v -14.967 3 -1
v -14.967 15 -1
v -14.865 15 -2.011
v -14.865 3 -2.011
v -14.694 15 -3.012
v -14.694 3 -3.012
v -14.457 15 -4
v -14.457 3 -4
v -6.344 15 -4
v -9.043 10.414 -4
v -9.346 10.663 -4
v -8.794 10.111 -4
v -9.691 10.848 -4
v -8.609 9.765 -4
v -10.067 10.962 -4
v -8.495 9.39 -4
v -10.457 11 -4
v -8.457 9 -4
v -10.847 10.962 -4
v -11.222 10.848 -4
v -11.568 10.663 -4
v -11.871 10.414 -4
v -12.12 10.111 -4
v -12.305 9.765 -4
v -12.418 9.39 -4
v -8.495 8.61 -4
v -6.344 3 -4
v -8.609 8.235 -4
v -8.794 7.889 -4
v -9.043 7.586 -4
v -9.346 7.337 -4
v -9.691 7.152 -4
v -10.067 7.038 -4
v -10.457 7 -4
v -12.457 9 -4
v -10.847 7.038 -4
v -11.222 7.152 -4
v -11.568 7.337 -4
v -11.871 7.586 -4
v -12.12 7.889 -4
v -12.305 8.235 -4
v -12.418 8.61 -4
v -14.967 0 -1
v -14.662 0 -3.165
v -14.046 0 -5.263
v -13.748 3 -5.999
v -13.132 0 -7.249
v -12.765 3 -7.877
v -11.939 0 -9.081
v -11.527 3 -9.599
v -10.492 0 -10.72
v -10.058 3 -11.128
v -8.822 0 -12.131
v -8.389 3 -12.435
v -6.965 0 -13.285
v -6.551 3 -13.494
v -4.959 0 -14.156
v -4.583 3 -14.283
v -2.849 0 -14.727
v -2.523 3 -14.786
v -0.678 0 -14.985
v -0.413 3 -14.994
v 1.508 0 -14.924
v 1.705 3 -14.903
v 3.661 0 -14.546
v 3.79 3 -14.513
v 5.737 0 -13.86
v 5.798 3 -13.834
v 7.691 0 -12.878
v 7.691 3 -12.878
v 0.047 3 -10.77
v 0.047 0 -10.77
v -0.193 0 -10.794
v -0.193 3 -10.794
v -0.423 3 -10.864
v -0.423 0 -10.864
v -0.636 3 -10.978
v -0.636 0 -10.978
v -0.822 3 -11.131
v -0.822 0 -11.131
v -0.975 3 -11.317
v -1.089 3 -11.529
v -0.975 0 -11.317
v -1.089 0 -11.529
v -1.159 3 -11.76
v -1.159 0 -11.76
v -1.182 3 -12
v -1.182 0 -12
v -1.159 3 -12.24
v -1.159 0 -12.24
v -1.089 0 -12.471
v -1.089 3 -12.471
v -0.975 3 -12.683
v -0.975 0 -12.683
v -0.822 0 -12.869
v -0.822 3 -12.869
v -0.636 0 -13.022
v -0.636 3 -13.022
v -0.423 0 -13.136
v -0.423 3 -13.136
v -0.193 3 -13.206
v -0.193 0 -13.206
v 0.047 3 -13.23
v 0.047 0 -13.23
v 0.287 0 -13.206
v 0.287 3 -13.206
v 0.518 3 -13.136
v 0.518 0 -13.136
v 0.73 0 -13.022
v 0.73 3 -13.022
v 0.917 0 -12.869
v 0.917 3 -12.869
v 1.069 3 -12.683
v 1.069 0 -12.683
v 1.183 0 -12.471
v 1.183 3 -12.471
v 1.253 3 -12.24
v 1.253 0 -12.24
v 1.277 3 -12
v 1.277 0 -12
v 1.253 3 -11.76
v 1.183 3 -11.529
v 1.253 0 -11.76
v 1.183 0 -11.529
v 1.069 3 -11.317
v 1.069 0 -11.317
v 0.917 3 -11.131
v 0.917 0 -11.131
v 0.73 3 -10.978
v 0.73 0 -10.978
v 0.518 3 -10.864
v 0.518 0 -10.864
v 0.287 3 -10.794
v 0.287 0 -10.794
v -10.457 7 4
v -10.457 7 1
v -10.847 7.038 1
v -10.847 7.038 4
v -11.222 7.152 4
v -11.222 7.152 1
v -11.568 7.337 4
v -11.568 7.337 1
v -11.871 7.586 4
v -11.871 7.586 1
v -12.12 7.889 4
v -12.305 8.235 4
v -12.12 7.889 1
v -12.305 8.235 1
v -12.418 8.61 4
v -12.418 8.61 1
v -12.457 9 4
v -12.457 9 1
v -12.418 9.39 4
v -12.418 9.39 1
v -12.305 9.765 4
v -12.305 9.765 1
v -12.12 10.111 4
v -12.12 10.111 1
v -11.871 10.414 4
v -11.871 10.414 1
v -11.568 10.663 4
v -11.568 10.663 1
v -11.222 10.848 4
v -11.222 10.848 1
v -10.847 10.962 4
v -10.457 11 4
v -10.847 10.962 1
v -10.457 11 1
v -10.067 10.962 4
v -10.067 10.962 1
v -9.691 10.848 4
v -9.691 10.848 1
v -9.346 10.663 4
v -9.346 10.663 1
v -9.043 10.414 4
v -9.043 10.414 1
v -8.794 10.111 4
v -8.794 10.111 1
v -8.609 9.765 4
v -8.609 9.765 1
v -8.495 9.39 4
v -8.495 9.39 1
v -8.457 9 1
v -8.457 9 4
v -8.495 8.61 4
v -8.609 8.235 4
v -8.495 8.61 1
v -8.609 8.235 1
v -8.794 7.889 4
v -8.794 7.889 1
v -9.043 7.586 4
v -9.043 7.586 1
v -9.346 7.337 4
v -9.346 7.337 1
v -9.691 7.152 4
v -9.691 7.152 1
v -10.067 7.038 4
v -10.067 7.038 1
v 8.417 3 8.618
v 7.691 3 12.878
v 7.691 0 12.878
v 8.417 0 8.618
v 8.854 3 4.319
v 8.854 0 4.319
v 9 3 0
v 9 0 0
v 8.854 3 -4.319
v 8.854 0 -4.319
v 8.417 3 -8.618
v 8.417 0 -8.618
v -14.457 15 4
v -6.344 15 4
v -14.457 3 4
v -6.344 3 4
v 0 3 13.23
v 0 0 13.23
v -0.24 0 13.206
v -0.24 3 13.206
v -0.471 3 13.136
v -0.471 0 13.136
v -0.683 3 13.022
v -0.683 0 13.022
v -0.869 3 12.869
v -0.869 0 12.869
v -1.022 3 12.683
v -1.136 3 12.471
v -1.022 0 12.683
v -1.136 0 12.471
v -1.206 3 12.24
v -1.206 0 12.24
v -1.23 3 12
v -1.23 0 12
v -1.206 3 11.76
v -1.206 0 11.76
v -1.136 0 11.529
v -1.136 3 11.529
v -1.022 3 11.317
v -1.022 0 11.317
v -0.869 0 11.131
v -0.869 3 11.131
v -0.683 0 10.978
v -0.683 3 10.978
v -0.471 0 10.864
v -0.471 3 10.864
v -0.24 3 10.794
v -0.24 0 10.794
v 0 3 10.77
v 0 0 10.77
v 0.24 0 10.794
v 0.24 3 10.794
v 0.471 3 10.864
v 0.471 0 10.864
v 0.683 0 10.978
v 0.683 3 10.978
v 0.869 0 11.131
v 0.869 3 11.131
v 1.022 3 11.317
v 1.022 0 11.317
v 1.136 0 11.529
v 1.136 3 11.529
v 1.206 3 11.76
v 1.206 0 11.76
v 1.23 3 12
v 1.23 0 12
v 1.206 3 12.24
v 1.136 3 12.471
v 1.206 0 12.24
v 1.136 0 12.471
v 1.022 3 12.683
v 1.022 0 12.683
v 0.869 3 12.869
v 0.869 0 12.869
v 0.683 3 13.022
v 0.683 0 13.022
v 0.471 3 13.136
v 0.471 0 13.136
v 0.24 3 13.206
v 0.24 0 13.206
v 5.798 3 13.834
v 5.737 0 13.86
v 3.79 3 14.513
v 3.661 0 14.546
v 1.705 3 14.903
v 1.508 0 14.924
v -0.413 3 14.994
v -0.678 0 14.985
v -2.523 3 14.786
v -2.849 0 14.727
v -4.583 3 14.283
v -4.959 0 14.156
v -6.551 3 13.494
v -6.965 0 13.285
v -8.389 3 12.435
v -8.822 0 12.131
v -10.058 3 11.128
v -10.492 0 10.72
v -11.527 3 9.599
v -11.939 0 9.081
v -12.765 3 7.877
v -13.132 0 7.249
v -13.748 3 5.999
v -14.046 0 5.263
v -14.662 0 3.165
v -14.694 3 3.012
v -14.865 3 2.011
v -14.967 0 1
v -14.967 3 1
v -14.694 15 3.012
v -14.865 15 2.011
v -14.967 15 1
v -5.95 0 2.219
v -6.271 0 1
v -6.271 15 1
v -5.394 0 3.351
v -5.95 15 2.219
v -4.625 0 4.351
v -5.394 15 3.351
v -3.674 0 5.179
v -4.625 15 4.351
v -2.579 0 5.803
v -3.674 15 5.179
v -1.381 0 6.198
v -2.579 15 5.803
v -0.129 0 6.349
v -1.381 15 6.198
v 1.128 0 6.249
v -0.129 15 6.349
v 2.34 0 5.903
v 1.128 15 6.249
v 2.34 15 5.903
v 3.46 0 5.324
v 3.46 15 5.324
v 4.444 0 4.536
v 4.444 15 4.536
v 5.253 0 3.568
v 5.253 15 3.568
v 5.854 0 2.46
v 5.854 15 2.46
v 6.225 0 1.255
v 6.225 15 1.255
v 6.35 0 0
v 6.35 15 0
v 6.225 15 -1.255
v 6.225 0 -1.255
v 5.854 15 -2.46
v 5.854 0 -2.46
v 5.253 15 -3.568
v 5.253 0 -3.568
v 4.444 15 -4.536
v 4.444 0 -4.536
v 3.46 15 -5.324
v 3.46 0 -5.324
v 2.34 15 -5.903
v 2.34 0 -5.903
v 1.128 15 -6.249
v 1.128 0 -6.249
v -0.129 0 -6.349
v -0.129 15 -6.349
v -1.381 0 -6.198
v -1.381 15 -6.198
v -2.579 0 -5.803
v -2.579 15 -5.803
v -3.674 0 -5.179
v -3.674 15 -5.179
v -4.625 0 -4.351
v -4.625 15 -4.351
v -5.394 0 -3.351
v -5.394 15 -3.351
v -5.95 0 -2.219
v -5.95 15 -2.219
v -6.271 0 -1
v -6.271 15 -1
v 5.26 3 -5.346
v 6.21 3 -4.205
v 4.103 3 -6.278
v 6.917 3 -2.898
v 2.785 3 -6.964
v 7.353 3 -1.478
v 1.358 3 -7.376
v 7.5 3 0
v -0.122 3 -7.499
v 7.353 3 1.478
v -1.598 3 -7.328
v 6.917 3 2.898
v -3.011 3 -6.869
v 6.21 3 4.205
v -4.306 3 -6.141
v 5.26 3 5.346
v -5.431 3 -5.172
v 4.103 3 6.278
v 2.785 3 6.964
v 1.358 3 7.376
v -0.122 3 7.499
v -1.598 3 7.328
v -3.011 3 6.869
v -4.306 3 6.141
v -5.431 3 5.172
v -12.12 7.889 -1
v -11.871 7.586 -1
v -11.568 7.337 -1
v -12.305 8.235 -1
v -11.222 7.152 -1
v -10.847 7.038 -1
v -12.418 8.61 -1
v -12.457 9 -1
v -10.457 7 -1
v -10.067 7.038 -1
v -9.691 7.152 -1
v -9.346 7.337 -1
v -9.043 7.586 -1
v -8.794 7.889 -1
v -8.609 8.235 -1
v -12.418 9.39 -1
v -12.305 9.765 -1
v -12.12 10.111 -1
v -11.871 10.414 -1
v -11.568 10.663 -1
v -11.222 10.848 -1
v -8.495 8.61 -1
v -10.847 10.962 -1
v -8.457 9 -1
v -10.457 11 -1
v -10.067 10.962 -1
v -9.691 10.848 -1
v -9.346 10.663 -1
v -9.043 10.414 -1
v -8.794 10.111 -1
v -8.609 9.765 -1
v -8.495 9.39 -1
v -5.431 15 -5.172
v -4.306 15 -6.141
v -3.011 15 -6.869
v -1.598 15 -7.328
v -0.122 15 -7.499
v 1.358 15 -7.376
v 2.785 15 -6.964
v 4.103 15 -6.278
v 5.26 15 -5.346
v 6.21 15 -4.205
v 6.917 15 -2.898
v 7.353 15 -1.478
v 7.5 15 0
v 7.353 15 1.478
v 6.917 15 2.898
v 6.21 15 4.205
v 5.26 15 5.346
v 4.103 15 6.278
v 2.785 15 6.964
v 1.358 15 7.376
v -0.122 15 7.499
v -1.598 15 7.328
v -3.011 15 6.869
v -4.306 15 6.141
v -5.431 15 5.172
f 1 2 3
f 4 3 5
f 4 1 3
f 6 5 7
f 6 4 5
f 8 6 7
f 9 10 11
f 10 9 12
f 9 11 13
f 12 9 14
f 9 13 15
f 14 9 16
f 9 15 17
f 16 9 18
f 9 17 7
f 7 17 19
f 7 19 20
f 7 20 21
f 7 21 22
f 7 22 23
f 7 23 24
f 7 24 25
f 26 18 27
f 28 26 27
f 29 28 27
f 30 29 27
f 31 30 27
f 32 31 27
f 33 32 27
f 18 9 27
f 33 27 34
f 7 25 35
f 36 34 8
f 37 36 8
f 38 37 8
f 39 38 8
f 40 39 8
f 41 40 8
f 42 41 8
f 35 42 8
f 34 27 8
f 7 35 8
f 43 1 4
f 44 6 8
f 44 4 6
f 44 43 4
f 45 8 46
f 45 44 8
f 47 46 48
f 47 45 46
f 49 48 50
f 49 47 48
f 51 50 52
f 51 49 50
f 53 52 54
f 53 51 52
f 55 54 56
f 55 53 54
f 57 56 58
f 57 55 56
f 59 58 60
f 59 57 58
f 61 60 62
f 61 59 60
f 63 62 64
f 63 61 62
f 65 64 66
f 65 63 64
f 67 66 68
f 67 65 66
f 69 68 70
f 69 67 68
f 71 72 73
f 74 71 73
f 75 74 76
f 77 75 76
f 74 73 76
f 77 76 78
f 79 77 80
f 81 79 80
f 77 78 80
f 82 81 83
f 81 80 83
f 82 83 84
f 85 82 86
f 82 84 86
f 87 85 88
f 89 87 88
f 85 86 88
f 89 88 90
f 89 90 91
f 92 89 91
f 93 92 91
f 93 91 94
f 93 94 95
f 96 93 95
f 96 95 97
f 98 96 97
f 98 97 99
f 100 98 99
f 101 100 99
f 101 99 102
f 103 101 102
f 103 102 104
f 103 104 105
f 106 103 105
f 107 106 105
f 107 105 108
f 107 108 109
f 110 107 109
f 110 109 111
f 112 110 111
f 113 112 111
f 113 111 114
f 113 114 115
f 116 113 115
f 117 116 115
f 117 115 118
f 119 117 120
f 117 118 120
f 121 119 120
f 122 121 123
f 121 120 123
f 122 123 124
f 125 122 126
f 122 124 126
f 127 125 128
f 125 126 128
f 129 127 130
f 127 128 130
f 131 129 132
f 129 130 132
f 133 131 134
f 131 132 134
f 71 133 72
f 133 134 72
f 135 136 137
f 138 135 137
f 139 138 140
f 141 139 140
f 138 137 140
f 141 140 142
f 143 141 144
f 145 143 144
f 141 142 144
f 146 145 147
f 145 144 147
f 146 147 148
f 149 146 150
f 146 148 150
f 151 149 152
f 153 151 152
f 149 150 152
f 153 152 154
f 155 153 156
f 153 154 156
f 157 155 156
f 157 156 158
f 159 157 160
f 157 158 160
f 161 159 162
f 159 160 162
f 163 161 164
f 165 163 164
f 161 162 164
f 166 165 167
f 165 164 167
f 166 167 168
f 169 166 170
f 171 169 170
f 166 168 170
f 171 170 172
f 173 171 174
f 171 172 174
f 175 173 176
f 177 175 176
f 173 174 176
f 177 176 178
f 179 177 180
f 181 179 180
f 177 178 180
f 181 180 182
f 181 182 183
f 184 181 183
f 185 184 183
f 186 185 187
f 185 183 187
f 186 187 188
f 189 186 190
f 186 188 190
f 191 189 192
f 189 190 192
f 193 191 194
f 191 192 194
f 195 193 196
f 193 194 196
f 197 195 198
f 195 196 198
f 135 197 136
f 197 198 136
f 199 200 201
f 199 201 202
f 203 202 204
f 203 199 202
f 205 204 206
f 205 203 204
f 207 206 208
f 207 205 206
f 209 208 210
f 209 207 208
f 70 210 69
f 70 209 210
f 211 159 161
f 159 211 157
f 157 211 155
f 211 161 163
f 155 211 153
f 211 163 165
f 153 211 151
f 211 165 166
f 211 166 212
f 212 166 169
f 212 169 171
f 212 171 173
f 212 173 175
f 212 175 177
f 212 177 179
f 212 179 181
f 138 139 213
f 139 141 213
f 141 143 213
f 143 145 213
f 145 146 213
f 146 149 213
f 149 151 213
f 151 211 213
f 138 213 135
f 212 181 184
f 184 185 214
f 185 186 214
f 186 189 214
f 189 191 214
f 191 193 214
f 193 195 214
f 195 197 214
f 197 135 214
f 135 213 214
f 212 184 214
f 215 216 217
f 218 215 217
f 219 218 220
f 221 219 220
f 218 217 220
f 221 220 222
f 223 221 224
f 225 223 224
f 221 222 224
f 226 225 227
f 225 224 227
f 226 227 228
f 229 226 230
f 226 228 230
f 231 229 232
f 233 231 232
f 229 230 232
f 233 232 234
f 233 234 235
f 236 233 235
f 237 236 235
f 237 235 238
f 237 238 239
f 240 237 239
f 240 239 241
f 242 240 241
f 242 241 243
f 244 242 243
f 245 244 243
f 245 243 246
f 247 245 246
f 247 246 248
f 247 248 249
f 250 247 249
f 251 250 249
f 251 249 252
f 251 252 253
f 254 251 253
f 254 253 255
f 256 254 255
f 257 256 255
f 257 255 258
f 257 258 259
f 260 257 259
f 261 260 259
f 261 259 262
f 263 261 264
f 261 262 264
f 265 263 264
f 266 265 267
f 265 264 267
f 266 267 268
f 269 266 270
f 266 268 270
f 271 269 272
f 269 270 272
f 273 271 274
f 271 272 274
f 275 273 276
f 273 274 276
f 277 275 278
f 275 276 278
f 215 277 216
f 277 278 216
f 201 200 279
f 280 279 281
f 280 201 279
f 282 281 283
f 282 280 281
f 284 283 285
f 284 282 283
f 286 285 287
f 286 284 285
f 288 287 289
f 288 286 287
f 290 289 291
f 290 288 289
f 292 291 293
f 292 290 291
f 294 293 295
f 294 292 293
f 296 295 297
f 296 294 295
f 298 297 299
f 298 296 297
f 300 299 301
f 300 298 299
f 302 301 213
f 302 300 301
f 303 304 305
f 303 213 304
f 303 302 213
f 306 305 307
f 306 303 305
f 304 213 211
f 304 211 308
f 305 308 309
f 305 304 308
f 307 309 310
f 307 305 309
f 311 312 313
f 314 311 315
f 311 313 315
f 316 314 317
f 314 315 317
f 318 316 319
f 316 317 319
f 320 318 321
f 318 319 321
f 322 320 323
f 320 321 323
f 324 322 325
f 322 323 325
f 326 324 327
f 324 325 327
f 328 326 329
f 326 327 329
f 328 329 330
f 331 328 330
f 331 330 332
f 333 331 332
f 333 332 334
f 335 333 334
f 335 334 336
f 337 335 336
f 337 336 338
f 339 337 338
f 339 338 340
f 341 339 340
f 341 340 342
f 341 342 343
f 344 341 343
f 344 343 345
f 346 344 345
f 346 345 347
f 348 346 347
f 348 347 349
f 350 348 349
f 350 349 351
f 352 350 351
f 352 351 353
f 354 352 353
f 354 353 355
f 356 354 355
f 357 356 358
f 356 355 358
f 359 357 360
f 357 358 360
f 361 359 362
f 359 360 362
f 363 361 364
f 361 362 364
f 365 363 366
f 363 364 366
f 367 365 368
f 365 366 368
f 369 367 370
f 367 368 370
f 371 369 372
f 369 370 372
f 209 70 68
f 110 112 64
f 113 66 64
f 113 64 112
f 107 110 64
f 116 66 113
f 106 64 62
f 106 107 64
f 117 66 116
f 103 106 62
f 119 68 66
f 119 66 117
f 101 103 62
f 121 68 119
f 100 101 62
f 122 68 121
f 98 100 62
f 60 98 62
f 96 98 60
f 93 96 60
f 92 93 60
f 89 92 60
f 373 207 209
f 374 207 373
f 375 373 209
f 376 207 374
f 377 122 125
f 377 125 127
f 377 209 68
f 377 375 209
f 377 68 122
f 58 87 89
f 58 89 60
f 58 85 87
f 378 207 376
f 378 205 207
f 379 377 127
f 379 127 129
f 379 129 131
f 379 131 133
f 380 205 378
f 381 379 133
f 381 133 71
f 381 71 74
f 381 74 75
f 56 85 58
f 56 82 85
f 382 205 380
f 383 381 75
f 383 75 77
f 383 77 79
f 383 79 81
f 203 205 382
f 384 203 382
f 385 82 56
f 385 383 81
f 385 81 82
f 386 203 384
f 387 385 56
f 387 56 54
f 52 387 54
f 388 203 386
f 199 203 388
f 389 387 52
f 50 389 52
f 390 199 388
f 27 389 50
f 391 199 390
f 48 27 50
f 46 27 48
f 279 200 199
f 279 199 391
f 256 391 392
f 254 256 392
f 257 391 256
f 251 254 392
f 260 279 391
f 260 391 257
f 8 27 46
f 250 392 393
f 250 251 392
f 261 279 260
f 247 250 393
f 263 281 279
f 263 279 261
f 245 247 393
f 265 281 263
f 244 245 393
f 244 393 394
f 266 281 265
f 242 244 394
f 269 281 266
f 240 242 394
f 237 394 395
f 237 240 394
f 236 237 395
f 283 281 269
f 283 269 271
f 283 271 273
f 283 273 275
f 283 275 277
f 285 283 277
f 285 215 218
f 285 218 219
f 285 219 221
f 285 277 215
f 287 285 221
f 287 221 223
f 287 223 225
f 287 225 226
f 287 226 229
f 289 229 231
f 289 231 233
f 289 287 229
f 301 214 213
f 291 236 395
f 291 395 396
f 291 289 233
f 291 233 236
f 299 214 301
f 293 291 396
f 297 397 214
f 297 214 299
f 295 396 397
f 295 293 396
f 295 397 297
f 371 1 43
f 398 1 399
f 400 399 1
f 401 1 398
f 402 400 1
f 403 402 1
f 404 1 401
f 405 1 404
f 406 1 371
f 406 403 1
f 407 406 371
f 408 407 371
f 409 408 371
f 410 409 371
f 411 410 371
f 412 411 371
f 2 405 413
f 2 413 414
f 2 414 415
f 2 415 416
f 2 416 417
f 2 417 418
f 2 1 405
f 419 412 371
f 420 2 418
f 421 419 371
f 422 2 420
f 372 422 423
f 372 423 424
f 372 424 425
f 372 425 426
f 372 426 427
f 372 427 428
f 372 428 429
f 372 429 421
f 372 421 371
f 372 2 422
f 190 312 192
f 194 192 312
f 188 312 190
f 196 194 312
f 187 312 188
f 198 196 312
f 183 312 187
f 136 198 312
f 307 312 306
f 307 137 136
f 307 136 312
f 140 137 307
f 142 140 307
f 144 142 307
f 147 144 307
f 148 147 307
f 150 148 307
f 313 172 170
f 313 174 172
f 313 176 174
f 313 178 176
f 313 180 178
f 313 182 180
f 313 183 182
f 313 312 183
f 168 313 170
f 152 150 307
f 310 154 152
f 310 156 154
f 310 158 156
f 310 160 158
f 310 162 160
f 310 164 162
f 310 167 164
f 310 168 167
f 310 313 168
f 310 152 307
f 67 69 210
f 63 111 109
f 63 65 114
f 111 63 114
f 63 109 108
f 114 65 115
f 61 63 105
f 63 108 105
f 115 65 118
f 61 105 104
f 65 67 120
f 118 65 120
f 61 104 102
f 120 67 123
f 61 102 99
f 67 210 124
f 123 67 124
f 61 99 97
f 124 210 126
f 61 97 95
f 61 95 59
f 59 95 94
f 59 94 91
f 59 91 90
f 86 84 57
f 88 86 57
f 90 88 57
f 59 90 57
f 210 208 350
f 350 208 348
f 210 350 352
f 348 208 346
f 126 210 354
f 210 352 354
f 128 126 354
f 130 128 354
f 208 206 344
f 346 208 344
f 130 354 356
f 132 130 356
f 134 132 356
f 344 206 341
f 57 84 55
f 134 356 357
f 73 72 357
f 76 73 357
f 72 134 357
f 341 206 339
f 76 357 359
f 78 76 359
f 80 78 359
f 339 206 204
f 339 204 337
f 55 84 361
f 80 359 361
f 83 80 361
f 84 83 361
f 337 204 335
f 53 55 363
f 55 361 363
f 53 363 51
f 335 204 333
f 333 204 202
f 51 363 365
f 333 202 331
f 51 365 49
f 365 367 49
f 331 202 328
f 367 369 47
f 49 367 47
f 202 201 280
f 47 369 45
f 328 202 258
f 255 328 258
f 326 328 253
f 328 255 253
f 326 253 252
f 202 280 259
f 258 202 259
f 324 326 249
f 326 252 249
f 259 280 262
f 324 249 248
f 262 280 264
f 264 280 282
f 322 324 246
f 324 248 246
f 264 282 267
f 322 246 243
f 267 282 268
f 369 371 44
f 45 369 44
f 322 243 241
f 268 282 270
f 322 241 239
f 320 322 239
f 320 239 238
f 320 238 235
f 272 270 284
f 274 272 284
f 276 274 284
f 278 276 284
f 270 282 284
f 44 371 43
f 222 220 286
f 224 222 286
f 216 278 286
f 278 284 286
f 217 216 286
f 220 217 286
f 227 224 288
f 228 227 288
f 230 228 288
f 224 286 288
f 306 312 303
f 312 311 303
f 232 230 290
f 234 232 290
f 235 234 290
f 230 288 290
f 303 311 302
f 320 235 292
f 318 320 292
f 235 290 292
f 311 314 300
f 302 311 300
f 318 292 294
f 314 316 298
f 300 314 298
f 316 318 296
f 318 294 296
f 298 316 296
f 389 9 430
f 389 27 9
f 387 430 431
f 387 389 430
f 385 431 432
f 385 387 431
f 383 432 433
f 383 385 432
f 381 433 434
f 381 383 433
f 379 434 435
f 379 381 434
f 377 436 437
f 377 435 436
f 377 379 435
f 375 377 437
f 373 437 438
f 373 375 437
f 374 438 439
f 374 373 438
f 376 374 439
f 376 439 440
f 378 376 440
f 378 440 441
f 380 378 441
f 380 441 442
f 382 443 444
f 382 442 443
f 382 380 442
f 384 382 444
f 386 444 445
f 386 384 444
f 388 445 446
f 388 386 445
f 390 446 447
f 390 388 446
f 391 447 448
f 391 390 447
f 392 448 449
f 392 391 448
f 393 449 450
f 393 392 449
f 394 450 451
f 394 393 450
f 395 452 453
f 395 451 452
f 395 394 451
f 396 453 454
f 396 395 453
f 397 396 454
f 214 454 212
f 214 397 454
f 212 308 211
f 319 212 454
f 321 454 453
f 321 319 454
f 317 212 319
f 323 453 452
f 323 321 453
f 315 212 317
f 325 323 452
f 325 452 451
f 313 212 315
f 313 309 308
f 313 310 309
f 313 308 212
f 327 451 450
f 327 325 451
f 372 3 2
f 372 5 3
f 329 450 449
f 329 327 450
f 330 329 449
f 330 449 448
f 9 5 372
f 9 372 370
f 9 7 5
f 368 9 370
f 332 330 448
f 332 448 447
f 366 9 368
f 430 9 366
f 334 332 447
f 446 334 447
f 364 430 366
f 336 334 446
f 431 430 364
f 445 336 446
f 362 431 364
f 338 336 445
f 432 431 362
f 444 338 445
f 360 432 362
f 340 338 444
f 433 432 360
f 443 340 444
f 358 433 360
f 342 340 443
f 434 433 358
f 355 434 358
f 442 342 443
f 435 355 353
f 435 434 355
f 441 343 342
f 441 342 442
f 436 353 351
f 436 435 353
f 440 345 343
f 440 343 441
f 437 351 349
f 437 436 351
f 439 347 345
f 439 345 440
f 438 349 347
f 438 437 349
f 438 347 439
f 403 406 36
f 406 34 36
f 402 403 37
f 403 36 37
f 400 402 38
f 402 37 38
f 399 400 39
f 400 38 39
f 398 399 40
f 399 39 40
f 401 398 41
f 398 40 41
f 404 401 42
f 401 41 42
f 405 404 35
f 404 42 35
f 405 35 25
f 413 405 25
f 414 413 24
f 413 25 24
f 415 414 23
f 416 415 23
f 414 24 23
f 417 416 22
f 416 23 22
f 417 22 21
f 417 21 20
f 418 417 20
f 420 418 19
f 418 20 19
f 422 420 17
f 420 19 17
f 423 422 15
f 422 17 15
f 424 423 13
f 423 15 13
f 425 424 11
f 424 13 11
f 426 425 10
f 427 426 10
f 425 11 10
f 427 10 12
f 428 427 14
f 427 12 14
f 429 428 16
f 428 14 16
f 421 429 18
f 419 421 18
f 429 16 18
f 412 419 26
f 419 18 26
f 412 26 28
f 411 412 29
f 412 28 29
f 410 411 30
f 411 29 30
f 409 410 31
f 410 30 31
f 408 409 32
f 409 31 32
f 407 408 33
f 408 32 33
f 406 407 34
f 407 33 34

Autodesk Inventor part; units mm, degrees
ref_plane "YZ Plane" through (0, 0, 0) normal (1, 0, 0) x (0, 1, 0)
ref_plane "XZ Plane" through (0, 0, 0) normal (0, 1, 0) x (-1, 0, 0)
ref_plane "XY Plane" through (0, 0, 0) normal (0, 0, 1) x (1, 0, 0)
sketch "Sketch1" plane through (0, 0, 0) normal (0, 0, 1) x (1, 0, 0)
  line L0 (-15, 0) -> (-6.35, 0)
  line L1 (-6.35, 0) -> (-6.35, 15)
  line L2 (-6.35, 15) -> (-7.5, 15)
  line L3 (-7.5, 15) -> (-7.5, 3)
  line L4 (-7.5, 3) -> (-15, 3)
  line L5 (-15, 3) -> (-15, 0)
  line L6 (0, -3) -> (0, 18) projected
  point P0 (0, 0)
  dimension "d0" = 3
  dimension "d2" = 15
  dimension "d3" = 6.35
  dimension "d4" = 15
  dimension "d17" = 7.5
  dimension "d18" = 1.15
revolve "Revolution1" add sketch "Sketch1" angle 360 about axis through (0, -10, 0) along (0, 1, 0)
sketch "Sketch2" plane through (0, 3, 0) normal (0, 1, 0) x (1, 0, 0)
  point P0 (0, 0)
  point P1 (0.0472, 12)
  point P2 (0, -12)
  dimension "d6" = 12
  dimension "d22" = 12
hole "Hole1" at (0.0472, 3, -12) at (0, 3, 12) direction (0, -1, 0) diameter 2.459 end through all thread size "M3x0.5" class "6H" standard "ISO Metric profile"
sketch "Sketch4" plane through (0, 3, 0) normal (0, 1, 0) x (1, 0, 0)
  circle A0 centre (0, 0) radius 15 projected
  circle A1 centre (0, 0) radius 7.5 projected
  circle A2 centre (-55, 0) radius 64
  point P0 (7.6909, 12.8783)
  point P1 (7.5, 0)
  point P2 (7.6909, -12.8783)
  dimension "d23" = 128
  dimension "d24" = 55
extrude "Extrusion2" cut sketch "Sketch4" against normal through all contours A0 A2 picked at (10.8452, -2.4648)
sketch "Sketch6" plane through (0, 3, 0) normal (0, 1, 0) x (1, 0, 0)
  arc A0 (7.6909, 12.8783) -> (7.6909, -12.8783) centre (0, 0) ccw projected
  circle A1 centre (0, 0) radius 7.5 projected
  line L0 (-6.3443, 4) -> (-15, 4)
  line L1 (-15, 4) -> (-15, -4)
  line L2 (-15, -4) -> (-6.3443, -4)
  line L3 (-6.3443, -4) -> (-6.3443, 4)
  point P0 (-14.4568, -4)
  point P1 (-6.3443, -4)
  point P2 (-14.4568, 4)
  dimension "d32" = 4
  dimension "d33" = 4
extrude "Extrusion3" add sketch "Sketch6" along normal up to surface (12 mm away) contours L0 A1 L2 A0
sketch "Sketch7" plane through (-14.4568, 15, -4) normal (0, 1, 0) x (1, 0, 0)
  circle A0 centre (14.4568, -4) radius 6.35 projected
  line L0 (8.1861, -5) -> (-0.5432, -5)
  line L1 (-0.5432, -5) -> (-0.5432, -3)
  line L2 (-0.5432, -3) -> (8.1861, -3)
  line L3 (8.1861, -3) -> (8.1861, -5)
  arc A1 (0, 0) -> (0, -8) centre (14.4568, -4) ccw projected
  point P0 (-0.5098, -5)
  point P1 (8.1861, -3)
  point P2 (-0.5098, -3)
  dimension "d27" = 1
  dimension "d28" = 1
extrude "Extrusion4" cut sketch "Sketch7" against normal through all contours A0 L0 A1 L2
sketch "Sketch8" plane through (-14.4568, 3, 4) normal (0, 0, 1) x (1, 0, 0)
  line L0 (0, 0) -> (0, 12) projected
  line L1 (8.1125, 12) -> (0, 12) projected
  point P0 (7.0914, 12)
  point P1 (4, 6)
  dimension "d35" = 12
  dimension "d37" = 4
  dimension "d38" = 6
hole "Hole2" at (-10.4568, 9, 4) direction (0, 0, -1) diameter 4 end through all
equation "\"d22\" = d6"
equation "\"d24\" = tubes_r"
equation "\"d33\" = d32"
equation "\"d28\" = d27"
equation "\"d38\" = 0.5 * d35"
equation "\"tubes_r\" = 55"
properties part number "BaffleClampWithScrew" material "Brass, Soft Yellow"
